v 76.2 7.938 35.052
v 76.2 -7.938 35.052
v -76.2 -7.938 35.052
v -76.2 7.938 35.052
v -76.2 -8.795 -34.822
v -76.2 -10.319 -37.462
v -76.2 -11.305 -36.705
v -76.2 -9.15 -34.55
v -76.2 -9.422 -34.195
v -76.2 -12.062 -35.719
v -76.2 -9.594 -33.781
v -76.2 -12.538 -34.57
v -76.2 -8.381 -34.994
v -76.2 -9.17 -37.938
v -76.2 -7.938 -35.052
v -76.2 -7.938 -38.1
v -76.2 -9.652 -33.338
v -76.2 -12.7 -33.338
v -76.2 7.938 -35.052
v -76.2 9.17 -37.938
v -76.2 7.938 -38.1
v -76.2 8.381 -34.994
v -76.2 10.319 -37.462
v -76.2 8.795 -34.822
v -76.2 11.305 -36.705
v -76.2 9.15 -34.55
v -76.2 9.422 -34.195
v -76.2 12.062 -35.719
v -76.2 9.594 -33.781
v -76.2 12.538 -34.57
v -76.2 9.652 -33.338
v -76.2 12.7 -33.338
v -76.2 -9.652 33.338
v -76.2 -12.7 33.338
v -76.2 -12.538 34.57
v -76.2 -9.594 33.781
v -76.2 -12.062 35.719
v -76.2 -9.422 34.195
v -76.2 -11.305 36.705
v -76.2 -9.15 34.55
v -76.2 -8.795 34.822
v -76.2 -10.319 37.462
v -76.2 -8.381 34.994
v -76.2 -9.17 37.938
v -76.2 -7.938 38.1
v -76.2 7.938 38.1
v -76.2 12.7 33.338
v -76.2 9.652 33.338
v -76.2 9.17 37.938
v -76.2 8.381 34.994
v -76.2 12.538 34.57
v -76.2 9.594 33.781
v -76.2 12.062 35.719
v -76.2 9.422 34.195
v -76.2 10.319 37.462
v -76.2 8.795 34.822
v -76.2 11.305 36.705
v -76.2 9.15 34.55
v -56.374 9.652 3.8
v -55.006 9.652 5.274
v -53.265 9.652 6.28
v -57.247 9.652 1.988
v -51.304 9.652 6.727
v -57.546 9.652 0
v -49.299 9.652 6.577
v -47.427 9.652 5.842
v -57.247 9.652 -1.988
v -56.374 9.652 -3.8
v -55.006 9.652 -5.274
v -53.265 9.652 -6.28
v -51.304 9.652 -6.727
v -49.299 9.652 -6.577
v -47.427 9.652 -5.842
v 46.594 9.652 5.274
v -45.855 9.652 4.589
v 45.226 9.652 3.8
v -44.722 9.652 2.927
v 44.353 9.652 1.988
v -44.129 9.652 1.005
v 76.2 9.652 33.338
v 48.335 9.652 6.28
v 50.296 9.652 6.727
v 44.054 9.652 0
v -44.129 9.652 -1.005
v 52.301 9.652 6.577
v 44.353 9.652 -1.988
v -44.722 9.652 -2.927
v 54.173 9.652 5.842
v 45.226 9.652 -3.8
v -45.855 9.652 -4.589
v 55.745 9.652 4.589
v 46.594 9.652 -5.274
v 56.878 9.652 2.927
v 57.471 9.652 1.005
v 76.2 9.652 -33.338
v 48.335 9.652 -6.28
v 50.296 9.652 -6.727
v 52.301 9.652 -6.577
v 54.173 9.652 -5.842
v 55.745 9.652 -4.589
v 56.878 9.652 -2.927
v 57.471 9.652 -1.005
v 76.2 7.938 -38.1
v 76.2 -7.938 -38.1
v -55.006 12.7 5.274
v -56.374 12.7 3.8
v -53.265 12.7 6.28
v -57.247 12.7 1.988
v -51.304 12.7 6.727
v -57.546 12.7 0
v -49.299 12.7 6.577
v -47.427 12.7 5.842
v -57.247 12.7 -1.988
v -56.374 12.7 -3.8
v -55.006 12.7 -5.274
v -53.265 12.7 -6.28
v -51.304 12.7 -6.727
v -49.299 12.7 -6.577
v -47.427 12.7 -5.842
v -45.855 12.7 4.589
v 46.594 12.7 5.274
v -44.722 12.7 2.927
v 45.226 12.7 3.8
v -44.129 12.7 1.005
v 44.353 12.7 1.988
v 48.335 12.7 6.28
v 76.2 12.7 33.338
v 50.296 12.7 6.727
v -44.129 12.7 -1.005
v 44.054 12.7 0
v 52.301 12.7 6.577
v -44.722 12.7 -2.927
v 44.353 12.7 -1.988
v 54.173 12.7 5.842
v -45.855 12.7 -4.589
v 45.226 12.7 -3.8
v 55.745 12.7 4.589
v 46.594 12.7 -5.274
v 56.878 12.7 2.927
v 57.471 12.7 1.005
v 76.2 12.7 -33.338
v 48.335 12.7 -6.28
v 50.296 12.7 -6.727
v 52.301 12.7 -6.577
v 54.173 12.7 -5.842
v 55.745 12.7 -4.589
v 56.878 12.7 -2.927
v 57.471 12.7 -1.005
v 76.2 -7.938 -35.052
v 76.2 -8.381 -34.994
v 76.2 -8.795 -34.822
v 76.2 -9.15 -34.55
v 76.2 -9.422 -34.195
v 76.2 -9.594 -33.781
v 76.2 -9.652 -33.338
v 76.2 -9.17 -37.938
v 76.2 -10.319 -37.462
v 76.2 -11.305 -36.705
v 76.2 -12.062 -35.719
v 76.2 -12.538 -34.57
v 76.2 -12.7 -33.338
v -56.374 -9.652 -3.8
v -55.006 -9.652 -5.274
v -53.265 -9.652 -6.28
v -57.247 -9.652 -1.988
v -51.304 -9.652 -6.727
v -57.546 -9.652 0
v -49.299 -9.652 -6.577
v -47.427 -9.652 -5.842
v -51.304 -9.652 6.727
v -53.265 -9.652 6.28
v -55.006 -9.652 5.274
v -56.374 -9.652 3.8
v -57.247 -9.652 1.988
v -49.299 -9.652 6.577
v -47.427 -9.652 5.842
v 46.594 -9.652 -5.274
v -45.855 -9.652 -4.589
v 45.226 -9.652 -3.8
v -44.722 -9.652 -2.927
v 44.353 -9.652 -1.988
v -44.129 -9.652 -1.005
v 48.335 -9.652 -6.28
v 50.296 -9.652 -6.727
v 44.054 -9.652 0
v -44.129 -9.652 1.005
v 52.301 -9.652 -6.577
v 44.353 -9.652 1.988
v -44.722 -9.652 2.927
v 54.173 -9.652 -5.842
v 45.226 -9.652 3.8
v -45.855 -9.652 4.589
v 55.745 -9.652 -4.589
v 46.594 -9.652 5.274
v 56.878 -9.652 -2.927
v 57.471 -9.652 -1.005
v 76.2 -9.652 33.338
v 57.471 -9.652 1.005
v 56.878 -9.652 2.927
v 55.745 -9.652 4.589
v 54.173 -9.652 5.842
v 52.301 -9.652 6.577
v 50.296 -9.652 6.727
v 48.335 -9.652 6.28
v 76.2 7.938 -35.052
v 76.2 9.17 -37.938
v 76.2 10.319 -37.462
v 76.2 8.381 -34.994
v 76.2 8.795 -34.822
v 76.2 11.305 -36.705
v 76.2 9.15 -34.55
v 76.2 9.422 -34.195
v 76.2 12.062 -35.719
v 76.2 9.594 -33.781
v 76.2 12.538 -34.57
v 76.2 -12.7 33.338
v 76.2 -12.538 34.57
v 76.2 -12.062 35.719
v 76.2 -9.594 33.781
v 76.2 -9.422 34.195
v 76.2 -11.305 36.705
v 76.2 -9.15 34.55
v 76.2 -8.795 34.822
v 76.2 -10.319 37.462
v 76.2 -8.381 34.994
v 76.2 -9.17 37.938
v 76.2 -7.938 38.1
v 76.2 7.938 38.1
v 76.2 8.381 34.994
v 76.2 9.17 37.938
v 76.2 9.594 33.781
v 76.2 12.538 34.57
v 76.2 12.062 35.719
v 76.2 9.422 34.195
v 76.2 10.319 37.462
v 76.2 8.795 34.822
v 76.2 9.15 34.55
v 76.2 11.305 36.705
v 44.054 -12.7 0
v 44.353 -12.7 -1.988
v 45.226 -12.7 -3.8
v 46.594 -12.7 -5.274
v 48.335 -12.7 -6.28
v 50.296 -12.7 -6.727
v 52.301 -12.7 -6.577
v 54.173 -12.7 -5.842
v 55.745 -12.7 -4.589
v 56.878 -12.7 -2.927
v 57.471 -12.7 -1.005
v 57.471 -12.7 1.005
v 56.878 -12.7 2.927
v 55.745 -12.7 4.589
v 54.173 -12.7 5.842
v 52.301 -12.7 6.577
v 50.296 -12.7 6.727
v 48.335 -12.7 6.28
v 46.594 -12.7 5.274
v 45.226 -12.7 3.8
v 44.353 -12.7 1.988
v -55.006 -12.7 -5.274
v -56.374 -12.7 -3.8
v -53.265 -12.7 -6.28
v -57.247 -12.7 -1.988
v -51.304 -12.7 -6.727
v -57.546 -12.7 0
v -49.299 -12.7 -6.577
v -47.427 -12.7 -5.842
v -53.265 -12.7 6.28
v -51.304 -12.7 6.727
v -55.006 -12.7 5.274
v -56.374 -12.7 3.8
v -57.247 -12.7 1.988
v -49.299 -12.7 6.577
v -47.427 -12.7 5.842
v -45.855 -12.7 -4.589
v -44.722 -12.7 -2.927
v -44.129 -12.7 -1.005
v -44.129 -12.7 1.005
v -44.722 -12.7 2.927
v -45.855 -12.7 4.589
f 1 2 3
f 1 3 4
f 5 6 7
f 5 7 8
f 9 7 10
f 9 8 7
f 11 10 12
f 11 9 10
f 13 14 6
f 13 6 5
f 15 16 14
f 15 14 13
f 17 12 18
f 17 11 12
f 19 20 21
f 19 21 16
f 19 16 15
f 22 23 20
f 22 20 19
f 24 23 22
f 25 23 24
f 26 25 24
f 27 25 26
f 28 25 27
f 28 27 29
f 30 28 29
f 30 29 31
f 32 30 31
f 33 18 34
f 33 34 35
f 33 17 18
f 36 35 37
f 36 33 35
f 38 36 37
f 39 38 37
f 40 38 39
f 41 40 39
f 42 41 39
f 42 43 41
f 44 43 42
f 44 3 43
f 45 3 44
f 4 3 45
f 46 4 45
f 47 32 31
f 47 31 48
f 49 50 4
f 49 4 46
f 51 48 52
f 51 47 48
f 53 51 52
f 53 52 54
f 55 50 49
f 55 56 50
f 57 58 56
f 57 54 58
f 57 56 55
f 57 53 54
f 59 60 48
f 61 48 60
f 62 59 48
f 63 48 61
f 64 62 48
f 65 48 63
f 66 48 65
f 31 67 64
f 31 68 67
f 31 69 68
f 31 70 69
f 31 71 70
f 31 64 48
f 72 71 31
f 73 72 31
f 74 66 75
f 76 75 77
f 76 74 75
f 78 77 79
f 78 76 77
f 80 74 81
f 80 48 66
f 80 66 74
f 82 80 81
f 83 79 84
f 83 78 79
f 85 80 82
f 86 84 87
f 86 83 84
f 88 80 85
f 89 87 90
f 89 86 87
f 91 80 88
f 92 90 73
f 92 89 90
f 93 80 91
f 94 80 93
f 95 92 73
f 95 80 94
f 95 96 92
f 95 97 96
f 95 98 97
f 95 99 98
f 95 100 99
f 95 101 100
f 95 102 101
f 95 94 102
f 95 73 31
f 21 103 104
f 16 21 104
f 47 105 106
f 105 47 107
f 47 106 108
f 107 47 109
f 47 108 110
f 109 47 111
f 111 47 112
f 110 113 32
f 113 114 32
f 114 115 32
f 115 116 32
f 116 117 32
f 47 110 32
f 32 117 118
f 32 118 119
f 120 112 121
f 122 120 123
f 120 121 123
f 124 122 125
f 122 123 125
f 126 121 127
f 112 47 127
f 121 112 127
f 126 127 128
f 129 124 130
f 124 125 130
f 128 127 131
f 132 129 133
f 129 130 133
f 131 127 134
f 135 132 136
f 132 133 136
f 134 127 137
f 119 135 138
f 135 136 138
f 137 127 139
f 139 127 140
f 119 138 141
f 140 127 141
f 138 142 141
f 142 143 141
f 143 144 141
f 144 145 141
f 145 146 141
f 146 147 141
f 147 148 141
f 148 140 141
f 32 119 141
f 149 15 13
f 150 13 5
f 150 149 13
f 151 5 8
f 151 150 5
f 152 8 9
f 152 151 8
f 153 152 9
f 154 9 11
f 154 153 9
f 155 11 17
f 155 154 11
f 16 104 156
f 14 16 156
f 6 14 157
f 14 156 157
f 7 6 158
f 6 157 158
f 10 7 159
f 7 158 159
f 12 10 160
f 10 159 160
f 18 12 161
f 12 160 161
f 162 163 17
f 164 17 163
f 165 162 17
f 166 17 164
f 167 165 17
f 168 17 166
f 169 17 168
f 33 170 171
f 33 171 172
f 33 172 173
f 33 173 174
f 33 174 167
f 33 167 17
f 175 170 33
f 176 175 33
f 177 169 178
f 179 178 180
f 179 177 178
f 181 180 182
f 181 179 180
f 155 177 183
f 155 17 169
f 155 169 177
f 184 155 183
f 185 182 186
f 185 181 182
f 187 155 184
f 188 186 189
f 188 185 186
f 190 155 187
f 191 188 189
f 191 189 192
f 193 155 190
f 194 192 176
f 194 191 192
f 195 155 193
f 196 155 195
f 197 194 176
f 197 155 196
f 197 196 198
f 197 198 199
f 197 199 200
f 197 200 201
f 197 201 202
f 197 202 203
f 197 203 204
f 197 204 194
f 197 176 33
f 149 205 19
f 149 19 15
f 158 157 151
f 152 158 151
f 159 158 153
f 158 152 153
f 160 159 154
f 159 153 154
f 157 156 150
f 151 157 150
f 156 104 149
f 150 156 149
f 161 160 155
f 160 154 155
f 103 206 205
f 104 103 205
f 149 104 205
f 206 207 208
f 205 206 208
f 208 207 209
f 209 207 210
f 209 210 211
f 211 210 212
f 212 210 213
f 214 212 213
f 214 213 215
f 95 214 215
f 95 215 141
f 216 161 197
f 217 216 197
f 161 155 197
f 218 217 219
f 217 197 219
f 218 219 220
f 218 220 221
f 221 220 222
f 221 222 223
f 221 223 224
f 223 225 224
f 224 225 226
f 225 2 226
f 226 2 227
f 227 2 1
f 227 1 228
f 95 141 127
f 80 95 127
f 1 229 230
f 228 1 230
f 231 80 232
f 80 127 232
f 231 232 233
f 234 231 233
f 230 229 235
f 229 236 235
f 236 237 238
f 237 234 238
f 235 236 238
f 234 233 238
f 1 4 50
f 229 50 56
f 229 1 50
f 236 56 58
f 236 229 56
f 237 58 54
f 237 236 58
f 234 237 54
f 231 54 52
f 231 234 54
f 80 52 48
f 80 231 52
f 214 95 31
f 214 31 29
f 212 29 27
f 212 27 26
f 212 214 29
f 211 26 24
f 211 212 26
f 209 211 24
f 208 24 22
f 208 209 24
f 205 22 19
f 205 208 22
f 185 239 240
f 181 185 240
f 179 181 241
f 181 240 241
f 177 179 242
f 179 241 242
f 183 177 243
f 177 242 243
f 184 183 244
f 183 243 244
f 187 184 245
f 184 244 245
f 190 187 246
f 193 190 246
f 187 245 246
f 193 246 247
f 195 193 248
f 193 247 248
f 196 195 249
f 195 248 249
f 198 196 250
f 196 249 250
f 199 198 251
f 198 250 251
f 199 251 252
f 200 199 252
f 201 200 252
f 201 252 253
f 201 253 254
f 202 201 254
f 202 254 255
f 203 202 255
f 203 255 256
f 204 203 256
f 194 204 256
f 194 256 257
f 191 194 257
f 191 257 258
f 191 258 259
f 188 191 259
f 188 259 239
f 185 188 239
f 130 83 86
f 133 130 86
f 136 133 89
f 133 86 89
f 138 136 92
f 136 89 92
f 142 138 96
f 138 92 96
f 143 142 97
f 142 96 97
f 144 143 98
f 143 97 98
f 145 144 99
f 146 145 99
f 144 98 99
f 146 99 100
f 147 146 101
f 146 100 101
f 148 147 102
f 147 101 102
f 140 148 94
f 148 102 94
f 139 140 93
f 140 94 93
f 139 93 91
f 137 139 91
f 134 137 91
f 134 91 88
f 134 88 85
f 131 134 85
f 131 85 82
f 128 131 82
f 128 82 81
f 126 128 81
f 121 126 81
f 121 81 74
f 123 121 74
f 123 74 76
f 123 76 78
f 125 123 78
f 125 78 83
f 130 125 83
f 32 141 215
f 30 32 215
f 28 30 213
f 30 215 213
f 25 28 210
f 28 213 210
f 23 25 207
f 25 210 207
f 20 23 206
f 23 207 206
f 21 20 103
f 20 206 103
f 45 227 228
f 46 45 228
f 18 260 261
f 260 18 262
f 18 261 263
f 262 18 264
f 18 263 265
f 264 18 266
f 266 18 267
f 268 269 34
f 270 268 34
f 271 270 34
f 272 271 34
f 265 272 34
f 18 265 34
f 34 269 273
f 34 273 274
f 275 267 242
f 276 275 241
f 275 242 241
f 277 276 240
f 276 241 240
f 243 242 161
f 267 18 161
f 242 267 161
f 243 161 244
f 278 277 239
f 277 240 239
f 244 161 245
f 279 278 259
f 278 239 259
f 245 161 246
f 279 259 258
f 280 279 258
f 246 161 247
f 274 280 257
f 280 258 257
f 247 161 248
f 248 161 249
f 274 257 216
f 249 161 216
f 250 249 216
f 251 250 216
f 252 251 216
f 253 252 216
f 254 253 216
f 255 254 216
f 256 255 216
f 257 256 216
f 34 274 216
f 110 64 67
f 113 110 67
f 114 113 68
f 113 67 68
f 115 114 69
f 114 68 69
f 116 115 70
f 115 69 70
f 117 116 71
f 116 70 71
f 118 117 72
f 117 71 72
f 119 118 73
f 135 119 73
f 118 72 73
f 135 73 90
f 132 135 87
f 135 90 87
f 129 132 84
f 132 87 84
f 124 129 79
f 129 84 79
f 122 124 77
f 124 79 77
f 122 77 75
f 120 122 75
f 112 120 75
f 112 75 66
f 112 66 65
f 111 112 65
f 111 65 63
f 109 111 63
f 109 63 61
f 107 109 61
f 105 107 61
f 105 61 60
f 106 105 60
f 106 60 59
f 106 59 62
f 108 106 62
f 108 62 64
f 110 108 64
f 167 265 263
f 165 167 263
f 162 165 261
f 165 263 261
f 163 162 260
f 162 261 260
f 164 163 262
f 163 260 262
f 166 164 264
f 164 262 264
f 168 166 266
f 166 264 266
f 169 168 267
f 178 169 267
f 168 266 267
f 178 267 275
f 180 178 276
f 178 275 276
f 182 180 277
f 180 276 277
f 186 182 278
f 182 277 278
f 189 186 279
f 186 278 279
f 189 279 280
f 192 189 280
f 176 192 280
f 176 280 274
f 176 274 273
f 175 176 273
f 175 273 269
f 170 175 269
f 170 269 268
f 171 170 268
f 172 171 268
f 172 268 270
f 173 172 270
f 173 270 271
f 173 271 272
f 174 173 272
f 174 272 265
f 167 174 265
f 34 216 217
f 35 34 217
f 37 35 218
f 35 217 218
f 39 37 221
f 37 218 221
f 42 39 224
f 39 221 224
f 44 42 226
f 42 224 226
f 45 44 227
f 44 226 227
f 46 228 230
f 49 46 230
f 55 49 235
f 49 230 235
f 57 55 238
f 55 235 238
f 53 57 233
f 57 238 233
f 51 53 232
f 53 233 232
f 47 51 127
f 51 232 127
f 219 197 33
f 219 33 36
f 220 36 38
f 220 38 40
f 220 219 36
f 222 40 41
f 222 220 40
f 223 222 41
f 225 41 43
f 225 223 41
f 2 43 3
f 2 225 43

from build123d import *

# Parameters (mm, degrees)
RECTANGULAR_TUBE_3_X_2_X_0_25_1_DEPTH = 152.4
F_1_2_CLEARANCE_HOLE1_D               = 13.49248


with BuildPart() as part:
    # Sketch16 → Rectangular tube 3 X 2 X 0.25(1) (new body)
    with BuildSketch(Plane.ZY.offset(-76.2)):
        with BuildLine():
            Line((-33.3375, -12.7), (33.3375, -12.7))
            ThreePointArc((33.3375, -12.7), (36.705096045, -11.305096045), (38.1, -7.9375))
            Line((38.1, -7.9375), (38.1, 7.9375))
            ThreePointArc((38.1, 7.9375), (36.705096045, 11.305096045), (33.3375, 12.7))
            Line((33.3375, 12.7), (-33.3375, 12.7))
            ThreePointArc((-33.3375, 12.7), (-36.705096045, 11.305096045), (-38.1, 7.9375))
            Line((-38.1, 7.9375), (-38.1, -7.9375))
            ThreePointArc((-38.1, -7.9375), (-36.705096045, -11.305096045), (-33.3375, -12.7))
        make_face()
        with BuildLine():
            Line((-33.3375, -9.652), (33.3375, -9.652))
            ThreePointArc((33.3375, -9.652), (34.549834576, -9.149834576), (35.052, -7.9375))
            Line((35.052, -7.9375), (35.052, 7.9375))
            ThreePointArc((35.052, 7.9375), (34.549834576, 9.149834576), (33.3375, 9.652))
            Line((33.3375, 9.652), (-33.3375, 9.652))
            ThreePointArc((-33.3375, 9.652), (-34.549834576, 9.149834576), (-35.052, 7.9375))
            Line((-35.052, 7.9375), (-35.052, -7.9375))
            ThreePointArc((-35.052, -7.9375), (-34.549834576, -9.149834576), (-33.3375, -9.652))
        make_face(mode=Mode.SUBTRACT)
    extrude(amount=RECTANGULAR_TUBE_3_X_2_X_0_25_1_DEPTH)

    # 1/2 Clearance Hole1 (through all)
    with Locations(Plane(origin=(0, 12.7, 0), x_dir=(1, 0, 0), z_dir=(0, 1, 0))):
        with Locations((-50.8, 0), (50.8, 0)):
            Hole(F_1_2_CLEARANCE_HOLE1_D / 2)


solid = part.part
